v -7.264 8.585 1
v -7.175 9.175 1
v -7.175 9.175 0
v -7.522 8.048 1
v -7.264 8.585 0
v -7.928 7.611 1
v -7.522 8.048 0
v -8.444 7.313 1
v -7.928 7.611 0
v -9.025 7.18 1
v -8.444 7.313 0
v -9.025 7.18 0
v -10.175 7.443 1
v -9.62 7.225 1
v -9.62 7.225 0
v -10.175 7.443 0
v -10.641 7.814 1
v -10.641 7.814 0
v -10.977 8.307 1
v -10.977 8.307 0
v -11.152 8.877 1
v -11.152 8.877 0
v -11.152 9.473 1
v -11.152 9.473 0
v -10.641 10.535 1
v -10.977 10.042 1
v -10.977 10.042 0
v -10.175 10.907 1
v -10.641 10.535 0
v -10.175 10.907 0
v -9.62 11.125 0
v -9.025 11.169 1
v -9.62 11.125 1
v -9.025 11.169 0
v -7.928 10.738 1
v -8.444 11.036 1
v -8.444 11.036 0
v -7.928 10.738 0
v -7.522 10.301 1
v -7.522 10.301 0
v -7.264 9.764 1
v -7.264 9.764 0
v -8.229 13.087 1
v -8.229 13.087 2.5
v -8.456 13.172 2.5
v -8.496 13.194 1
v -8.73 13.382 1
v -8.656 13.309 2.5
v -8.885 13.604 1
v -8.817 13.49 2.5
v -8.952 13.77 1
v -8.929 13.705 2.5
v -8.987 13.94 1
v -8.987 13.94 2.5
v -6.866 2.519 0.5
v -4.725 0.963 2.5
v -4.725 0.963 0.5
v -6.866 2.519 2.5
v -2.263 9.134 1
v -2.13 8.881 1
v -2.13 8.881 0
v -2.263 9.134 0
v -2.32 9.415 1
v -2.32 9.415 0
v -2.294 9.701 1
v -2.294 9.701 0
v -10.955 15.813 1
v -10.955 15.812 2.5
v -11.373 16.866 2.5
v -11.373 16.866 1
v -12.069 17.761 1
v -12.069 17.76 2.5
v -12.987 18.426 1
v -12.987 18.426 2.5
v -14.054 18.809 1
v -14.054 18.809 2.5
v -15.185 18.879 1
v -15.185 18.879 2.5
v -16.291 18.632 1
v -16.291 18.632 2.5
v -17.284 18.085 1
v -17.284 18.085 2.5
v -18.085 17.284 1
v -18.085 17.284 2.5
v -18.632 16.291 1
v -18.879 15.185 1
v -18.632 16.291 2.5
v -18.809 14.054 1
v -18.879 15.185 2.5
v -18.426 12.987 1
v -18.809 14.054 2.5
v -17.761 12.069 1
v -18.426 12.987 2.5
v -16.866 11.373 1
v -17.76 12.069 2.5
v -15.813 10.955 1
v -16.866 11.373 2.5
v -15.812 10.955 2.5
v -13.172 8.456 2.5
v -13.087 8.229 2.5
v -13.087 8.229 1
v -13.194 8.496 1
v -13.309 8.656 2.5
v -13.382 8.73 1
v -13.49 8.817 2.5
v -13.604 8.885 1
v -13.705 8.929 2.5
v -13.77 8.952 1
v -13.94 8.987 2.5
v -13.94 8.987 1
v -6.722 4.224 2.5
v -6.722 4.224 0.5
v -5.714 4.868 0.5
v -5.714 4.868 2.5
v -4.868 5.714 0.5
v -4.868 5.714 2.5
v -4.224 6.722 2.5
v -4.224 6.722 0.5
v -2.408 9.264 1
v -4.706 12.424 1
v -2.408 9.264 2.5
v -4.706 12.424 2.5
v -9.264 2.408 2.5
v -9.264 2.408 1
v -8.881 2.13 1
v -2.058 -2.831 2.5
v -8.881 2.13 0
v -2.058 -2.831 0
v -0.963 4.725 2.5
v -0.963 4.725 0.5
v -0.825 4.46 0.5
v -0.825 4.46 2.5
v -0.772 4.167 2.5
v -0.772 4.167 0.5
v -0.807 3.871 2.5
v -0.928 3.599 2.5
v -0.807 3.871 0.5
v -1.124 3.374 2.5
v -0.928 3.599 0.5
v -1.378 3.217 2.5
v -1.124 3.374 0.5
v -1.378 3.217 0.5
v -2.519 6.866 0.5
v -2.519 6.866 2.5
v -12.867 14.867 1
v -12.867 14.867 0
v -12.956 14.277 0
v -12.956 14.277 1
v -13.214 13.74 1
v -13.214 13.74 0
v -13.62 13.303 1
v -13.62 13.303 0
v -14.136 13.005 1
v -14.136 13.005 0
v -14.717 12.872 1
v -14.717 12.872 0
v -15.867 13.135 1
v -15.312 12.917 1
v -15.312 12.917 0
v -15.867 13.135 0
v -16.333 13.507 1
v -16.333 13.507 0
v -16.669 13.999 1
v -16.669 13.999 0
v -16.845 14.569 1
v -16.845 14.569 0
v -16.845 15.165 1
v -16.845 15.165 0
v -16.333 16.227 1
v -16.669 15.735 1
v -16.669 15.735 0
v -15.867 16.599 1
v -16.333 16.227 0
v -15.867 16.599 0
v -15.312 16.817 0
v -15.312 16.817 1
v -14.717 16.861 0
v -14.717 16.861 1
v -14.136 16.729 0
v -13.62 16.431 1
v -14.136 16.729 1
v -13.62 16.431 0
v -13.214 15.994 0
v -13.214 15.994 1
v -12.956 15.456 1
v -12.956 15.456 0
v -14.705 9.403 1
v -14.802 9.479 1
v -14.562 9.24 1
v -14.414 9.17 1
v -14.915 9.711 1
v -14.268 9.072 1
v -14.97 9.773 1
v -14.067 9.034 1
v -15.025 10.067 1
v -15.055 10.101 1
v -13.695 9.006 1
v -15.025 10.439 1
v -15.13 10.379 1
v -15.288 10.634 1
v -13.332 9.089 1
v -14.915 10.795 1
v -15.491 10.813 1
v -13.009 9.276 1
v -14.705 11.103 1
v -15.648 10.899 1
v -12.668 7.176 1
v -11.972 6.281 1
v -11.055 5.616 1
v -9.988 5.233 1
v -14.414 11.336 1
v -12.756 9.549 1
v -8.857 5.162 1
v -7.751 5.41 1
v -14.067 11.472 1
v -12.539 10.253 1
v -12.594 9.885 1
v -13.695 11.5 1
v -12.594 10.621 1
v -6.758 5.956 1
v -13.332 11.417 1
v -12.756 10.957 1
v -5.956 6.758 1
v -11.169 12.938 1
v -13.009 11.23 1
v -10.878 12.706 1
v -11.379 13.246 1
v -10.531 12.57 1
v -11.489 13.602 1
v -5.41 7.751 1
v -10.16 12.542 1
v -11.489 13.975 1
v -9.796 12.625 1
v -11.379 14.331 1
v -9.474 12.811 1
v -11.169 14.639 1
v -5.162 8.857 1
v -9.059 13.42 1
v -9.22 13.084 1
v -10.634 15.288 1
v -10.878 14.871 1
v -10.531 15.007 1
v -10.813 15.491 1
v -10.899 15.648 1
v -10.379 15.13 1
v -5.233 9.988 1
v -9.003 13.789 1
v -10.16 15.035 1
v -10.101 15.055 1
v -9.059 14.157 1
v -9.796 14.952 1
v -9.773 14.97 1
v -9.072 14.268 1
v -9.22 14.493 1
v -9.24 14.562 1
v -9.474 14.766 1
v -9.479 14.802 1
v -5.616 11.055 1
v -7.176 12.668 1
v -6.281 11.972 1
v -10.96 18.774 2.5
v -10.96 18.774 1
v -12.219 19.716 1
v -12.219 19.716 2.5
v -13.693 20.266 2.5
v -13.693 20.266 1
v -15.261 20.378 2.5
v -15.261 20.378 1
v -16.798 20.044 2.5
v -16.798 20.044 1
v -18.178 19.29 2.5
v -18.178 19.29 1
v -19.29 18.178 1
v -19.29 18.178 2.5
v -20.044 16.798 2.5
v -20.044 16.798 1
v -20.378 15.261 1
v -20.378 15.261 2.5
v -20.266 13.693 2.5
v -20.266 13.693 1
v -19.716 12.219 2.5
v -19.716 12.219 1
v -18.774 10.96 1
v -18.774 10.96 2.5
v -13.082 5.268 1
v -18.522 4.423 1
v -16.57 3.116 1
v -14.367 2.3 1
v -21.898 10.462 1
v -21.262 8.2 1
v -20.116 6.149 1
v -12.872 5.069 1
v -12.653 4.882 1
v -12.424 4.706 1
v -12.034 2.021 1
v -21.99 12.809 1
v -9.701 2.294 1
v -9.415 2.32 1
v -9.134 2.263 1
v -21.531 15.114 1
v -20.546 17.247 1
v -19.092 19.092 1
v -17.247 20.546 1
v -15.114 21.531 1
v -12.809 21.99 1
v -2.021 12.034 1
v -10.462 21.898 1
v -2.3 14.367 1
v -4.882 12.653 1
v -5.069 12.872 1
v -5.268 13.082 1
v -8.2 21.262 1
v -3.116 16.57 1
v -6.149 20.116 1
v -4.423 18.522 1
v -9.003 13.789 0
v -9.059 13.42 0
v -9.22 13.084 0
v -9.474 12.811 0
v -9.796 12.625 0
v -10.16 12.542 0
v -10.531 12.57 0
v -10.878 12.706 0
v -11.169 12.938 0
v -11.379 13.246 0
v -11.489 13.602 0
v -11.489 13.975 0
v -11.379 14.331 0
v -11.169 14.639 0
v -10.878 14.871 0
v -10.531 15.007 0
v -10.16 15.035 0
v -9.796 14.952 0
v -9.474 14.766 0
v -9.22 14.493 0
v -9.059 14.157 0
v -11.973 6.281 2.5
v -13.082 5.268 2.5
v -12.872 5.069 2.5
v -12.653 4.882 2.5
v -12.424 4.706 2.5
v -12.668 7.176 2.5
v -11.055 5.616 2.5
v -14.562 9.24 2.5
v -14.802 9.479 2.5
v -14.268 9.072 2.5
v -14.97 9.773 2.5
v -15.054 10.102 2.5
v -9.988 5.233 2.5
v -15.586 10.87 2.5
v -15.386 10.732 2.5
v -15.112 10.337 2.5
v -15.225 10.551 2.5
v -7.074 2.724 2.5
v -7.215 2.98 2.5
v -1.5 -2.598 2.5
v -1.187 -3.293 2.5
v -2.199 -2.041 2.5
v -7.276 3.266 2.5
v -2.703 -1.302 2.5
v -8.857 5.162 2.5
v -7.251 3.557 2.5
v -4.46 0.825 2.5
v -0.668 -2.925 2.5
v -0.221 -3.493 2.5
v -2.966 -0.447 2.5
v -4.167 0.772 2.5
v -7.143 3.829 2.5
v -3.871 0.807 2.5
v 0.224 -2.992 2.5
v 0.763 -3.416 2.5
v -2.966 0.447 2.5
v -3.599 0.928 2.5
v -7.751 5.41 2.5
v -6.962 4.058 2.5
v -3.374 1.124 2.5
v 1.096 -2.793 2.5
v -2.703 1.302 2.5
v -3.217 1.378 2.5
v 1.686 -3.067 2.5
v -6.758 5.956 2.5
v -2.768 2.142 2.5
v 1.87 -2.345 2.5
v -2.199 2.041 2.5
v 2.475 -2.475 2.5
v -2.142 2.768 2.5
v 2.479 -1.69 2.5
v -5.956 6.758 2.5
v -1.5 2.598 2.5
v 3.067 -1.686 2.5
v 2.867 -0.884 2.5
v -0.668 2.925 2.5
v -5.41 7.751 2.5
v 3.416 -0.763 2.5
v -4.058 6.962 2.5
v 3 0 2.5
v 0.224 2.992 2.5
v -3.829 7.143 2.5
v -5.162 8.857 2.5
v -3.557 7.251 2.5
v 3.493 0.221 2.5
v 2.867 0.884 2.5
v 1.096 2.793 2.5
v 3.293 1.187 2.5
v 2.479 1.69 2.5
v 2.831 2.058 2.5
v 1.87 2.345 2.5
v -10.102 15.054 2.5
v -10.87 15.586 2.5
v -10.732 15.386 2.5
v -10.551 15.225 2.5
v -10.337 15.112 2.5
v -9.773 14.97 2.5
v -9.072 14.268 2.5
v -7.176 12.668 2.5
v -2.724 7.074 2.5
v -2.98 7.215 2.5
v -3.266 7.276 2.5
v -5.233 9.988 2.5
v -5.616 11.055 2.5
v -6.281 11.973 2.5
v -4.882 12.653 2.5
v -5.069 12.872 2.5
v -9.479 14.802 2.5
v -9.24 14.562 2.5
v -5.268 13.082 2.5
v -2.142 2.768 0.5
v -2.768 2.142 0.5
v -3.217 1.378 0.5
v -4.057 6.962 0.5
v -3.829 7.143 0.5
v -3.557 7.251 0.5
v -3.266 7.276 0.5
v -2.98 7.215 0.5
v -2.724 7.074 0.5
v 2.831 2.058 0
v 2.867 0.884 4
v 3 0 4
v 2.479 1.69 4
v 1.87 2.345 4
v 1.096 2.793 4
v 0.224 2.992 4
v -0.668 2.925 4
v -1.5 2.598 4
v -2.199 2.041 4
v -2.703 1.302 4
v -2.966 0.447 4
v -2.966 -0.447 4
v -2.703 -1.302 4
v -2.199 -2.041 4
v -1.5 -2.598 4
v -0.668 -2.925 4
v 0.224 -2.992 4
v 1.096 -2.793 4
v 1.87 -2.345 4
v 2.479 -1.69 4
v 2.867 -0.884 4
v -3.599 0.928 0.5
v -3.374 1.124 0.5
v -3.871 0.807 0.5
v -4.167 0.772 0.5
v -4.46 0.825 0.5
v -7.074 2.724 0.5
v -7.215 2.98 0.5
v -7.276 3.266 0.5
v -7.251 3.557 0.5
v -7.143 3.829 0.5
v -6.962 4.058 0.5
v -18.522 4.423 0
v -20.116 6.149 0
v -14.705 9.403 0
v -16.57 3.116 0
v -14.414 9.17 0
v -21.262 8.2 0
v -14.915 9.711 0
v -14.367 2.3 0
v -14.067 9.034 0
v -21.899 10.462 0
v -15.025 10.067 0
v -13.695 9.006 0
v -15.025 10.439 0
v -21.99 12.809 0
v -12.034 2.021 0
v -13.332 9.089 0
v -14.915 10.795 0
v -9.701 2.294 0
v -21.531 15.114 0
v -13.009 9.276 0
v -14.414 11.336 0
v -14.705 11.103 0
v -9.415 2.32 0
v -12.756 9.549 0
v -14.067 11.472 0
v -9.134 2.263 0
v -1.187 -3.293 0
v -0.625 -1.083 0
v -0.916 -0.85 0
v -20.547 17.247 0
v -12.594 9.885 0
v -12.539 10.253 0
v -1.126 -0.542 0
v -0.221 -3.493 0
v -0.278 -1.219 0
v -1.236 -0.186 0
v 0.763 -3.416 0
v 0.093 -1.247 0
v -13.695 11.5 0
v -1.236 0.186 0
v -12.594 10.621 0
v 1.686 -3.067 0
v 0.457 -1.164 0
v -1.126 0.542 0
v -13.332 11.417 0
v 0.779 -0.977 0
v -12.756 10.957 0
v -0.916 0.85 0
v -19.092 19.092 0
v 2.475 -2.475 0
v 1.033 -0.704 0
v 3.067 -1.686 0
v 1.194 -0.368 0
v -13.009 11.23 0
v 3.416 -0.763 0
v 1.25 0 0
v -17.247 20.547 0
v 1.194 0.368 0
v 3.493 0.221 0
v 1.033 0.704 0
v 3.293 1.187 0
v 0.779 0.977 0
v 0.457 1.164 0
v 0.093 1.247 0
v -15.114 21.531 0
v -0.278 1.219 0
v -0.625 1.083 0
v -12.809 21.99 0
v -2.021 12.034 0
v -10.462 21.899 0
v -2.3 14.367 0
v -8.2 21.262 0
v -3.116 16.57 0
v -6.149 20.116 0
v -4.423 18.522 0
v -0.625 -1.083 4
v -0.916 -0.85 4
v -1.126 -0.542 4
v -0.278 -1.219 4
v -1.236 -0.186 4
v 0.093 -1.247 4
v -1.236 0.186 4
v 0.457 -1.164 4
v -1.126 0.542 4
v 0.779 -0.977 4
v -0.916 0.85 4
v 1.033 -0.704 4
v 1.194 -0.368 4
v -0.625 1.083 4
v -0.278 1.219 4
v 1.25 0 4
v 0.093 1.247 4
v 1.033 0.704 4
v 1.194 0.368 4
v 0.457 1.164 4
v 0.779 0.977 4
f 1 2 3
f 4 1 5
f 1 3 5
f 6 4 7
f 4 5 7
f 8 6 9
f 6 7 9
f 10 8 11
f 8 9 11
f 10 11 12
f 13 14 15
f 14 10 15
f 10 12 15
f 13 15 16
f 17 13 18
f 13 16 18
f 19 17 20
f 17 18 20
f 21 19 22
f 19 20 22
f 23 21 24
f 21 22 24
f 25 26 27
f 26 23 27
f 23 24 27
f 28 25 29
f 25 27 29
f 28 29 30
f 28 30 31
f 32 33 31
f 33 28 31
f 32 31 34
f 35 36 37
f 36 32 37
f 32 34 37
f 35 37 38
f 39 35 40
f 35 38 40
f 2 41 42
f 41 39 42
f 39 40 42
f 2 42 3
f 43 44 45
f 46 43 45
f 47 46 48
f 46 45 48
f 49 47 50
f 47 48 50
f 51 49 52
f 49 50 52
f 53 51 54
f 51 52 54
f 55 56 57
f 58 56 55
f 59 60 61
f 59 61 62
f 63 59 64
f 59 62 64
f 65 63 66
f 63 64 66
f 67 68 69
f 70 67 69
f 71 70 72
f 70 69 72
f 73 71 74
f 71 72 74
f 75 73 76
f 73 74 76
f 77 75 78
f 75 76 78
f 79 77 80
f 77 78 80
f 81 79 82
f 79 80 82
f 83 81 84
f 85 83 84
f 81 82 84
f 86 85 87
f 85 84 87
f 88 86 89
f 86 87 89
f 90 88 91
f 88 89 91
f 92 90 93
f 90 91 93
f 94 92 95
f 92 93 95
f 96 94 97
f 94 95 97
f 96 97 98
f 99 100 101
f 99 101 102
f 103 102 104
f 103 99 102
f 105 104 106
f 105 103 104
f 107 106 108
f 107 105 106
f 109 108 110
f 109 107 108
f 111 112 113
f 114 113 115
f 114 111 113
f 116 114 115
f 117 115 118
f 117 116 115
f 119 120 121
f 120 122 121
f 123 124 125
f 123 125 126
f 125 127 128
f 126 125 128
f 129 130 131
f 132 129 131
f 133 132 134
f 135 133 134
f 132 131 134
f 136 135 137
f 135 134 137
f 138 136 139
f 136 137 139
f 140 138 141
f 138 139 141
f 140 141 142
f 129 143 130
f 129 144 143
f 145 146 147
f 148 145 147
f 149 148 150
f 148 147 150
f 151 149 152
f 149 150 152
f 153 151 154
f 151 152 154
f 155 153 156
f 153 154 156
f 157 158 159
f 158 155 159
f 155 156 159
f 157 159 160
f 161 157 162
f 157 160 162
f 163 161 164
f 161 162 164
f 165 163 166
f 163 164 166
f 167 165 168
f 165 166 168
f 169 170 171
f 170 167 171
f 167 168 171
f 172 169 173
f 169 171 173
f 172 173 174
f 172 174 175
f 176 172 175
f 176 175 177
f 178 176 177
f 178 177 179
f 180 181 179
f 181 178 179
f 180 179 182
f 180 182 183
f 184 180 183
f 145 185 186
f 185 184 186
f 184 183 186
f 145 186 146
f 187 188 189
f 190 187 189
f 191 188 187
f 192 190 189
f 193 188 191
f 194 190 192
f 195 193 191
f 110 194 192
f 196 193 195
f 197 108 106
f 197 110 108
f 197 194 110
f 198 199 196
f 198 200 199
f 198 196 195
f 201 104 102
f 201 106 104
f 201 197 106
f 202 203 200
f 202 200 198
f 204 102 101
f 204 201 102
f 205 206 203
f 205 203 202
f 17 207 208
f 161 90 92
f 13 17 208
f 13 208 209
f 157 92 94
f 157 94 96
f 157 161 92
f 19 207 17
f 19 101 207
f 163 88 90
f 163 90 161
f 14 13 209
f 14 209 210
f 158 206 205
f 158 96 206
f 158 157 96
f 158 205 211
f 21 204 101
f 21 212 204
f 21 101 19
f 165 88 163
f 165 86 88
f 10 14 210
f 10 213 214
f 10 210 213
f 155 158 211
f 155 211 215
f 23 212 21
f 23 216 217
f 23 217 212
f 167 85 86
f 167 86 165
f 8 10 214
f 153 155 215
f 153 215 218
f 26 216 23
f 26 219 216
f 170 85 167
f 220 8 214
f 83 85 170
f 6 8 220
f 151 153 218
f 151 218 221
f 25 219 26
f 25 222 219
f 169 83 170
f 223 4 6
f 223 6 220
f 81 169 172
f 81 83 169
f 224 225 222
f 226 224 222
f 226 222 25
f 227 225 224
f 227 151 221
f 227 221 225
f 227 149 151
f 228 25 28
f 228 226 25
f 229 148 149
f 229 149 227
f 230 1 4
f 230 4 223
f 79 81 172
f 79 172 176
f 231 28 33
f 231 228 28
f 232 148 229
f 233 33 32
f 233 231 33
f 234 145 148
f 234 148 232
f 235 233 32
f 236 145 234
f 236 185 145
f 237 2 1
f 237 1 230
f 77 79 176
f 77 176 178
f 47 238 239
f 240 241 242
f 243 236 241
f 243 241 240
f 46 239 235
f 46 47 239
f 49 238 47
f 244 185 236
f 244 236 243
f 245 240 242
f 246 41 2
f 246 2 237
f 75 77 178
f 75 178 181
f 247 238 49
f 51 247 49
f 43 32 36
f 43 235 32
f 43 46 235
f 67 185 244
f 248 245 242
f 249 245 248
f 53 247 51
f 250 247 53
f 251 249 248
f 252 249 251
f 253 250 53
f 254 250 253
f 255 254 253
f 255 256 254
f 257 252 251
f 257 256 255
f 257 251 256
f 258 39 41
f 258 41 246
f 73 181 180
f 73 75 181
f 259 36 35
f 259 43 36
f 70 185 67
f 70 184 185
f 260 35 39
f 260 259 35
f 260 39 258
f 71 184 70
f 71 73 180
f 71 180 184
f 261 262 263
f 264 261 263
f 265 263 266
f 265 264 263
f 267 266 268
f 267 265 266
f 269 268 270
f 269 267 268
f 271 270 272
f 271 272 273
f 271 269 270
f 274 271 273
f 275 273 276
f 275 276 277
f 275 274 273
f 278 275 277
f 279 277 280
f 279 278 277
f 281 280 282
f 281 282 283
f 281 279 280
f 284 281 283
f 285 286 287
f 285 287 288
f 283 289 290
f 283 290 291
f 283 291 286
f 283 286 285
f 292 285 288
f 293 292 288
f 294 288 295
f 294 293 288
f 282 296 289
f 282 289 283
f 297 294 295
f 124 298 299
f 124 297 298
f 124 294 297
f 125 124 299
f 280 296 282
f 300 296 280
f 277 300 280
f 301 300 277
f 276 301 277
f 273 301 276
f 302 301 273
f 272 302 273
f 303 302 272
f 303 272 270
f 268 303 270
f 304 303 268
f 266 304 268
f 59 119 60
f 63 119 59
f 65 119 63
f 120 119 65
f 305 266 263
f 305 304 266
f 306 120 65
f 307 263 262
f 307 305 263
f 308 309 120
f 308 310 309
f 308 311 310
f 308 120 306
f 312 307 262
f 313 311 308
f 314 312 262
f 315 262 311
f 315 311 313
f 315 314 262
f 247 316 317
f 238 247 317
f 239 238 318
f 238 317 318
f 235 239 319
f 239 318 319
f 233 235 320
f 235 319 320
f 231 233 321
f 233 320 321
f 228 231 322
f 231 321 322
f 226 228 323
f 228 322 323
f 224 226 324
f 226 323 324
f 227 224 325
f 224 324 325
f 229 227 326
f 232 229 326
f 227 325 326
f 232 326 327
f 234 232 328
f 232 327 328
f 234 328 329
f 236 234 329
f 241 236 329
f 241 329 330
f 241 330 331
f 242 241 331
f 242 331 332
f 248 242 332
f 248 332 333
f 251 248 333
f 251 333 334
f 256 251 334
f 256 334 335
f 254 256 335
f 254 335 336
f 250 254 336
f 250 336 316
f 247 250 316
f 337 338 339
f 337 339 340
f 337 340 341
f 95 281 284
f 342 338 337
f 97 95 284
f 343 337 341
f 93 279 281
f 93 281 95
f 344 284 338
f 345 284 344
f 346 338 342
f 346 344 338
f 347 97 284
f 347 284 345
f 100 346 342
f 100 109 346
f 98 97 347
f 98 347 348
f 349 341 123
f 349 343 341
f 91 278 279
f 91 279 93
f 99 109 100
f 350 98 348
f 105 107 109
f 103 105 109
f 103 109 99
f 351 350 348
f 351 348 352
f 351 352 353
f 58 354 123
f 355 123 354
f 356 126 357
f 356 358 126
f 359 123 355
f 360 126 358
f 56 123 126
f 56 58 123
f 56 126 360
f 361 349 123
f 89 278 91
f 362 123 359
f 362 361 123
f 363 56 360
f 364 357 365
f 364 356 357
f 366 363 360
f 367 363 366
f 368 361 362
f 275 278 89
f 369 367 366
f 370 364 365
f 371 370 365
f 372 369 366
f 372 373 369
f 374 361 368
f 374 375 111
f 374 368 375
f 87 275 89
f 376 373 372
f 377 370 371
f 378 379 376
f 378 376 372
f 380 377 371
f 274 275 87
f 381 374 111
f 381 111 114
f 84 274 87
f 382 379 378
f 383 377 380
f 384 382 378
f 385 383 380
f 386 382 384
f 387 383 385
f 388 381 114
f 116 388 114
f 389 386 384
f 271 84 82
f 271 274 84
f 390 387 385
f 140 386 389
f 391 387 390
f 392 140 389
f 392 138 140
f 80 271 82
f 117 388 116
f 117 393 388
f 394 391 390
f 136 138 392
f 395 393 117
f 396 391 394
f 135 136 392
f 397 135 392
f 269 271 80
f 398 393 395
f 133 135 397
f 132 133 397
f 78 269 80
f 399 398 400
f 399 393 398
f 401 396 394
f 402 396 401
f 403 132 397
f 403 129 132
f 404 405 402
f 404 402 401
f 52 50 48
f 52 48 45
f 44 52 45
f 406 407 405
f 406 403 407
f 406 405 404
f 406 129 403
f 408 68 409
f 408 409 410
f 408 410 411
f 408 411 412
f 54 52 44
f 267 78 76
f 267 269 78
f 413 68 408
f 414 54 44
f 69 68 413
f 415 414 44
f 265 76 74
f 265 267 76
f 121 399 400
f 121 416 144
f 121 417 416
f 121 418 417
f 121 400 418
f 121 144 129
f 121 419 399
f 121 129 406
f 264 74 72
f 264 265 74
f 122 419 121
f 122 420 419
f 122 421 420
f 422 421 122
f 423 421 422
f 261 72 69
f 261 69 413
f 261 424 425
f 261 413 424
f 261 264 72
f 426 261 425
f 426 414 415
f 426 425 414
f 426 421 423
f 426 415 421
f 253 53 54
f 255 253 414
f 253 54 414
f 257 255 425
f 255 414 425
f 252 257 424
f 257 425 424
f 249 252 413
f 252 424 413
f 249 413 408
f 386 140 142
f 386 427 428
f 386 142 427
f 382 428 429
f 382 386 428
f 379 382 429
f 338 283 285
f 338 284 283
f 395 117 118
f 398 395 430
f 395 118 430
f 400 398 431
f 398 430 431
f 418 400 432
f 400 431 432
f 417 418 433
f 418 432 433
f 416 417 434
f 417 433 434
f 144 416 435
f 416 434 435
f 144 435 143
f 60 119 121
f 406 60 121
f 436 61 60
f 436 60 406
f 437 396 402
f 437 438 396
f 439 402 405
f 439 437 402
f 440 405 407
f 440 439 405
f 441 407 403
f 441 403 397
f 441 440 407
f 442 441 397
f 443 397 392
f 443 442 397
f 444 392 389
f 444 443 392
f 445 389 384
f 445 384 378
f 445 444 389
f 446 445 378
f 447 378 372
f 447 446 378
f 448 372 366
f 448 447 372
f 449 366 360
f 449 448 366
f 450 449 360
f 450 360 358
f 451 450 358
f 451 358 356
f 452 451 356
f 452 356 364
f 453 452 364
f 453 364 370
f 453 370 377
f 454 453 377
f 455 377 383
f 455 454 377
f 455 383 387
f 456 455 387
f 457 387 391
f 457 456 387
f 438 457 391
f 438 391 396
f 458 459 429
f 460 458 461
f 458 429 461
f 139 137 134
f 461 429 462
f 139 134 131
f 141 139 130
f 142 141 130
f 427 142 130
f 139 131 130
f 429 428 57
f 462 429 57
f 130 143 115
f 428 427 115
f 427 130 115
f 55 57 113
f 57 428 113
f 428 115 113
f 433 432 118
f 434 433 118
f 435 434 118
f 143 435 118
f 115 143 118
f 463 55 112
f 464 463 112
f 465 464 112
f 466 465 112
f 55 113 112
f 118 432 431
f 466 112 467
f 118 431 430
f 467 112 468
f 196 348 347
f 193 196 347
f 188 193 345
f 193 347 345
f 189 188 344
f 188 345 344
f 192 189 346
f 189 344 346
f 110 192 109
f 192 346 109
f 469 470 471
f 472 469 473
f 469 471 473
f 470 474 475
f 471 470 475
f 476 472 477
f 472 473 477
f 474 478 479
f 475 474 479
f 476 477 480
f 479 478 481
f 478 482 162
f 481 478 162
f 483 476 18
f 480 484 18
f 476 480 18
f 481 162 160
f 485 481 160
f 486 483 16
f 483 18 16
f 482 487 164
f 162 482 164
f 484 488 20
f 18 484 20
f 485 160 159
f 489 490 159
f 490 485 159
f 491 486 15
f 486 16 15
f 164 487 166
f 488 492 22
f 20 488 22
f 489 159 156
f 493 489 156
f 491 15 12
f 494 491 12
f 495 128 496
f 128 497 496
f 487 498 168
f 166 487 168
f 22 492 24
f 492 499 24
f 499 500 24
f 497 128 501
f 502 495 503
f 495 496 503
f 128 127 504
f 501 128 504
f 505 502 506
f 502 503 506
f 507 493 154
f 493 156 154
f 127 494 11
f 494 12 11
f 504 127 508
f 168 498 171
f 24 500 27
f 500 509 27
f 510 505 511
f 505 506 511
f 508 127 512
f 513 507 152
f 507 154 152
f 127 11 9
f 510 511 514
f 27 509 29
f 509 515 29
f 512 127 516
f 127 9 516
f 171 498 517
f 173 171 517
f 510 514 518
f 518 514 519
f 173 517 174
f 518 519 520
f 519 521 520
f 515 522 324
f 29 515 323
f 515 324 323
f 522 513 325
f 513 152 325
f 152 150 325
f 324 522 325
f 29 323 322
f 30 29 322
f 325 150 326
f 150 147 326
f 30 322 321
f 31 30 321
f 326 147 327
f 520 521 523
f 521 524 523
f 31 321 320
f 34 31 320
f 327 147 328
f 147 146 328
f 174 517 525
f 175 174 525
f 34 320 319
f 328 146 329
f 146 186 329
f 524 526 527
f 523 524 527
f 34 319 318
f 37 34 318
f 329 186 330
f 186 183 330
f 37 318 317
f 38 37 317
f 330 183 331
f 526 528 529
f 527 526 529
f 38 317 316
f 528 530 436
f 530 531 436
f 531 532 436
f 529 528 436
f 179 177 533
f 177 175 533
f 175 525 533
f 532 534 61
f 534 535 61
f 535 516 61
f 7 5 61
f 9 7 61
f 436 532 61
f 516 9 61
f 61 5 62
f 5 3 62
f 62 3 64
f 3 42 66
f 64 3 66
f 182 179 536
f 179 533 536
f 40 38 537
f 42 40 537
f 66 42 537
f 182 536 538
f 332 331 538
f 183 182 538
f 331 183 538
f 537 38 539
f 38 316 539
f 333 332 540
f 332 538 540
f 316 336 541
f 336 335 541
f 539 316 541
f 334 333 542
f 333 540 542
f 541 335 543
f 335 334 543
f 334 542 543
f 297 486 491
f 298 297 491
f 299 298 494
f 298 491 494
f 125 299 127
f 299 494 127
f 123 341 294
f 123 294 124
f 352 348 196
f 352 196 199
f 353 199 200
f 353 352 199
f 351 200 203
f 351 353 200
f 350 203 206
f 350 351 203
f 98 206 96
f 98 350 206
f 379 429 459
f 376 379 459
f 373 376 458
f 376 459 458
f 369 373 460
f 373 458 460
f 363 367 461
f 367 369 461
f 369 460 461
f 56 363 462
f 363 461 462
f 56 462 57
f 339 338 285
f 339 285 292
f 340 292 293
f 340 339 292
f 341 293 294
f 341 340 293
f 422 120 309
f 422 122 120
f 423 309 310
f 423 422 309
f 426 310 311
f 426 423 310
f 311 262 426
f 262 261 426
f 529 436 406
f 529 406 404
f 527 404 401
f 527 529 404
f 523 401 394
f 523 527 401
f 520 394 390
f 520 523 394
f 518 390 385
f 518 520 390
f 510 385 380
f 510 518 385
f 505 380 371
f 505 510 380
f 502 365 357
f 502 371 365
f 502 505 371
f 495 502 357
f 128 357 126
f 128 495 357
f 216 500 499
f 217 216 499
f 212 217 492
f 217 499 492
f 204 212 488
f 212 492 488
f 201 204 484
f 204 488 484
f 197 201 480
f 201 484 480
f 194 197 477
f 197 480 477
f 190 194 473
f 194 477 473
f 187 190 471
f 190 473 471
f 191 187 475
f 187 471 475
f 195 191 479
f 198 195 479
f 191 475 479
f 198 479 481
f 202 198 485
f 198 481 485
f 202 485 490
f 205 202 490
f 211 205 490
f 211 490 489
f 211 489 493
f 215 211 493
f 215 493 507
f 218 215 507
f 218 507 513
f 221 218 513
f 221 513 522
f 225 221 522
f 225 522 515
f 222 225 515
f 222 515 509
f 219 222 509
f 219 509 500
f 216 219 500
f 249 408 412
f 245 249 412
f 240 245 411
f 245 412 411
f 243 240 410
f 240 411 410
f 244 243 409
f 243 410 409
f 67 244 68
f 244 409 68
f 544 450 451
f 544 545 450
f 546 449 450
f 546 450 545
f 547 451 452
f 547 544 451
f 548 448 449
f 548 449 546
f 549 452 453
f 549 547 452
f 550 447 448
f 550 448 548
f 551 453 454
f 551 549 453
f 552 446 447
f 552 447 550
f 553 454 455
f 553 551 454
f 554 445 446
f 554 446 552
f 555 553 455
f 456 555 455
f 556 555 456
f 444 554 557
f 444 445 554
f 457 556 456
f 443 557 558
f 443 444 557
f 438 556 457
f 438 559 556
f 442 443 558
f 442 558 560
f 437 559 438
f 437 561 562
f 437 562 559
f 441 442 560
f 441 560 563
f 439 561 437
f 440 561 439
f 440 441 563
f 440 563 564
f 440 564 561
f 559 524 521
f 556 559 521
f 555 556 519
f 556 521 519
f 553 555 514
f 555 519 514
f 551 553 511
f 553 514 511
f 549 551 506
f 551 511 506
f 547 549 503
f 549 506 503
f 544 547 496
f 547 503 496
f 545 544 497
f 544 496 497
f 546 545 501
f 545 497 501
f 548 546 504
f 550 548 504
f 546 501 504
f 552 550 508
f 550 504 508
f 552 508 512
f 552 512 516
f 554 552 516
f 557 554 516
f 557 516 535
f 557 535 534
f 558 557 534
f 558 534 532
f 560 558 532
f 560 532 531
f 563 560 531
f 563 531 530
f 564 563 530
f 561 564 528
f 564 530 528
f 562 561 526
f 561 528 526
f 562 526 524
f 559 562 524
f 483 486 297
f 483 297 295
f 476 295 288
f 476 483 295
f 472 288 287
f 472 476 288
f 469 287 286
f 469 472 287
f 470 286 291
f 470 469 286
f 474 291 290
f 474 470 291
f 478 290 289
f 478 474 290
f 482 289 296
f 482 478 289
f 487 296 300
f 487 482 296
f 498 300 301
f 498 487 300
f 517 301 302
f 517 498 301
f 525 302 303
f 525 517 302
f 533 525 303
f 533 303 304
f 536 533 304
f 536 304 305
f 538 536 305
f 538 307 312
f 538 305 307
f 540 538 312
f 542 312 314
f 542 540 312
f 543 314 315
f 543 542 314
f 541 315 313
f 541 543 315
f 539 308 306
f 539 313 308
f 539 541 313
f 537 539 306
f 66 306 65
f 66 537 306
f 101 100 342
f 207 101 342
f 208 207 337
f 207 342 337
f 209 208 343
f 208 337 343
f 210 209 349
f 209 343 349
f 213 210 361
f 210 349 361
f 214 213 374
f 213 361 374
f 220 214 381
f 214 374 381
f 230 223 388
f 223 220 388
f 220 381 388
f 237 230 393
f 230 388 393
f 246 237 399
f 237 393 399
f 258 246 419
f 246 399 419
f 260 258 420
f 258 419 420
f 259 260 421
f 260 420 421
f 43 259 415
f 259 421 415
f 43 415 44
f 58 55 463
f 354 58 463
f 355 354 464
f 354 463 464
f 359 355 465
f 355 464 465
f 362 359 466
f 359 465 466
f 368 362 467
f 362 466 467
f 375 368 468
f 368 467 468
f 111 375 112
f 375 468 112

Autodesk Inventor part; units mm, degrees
ref_plane "YZ Plane" through (0, 0, 0) normal (1, 0, 0) x (0, 1, 0)
ref_plane "XZ Plane" through (0, 0, 0) normal (0, 1, 0) x (-1, 0, 0)
ref_plane "XY Plane" through (0, 0, 0) normal (0, 0, 1) x (1, 0, 0)
sketch "スケッチ1" plane through (0, 0, 0) normal (0, 0, 1) x (1, 0, 0)
  line L0 (0, 0) -> (-12.0208, 12.0208)
  circle A0 centre (-9.1747, 9.1747) radius 2
  circle A1 centre (-14.8669, 14.8669) radius 2
  circle A2 centre (-14.8669, 14.8669) radius 4.025 construction
  circle A3 centre (-9.1747, 9.1747) radius 4.025 construction
  circle A4 centre (-13.7886, 10.253) radius 1.25
  circle A5 centre (-10.253, 13.7886) radius 1.25
  line L1 (-13.7886, 10.253) -> (-10.253, 13.7886) construction
  circle A6 centre (0, 0) radius 1.25
  arc A7 (-2.4749, 2.4749) -> (-2.0583, -2.8308) centre (0, 0) ccw construction
  arc A8 (-14.6971, 9.3445) -> (-9.5747, 16.4536) centre (-14.8669, 14.8669) ccw construction
  arc A9 (-14.467, 7.588) -> (-12.4239, 4.7061) centre (-9.1747, 9.1747) ccw
  line L2 (-12.4239, 4.7061) -> (-2.0583, -2.8308)
  line L3 (-4.7061, 12.4239) -> (2.8308, 2.0583)
  arc A10 (-11.1417, 16.3911) -> (-7.588, 14.467) centre (-10.253, 13.7886) ccw construction
  arc A11 (-16.4536, 9.5747) -> (-14.467, 7.588) centre (-13.7886, 10.253) ccw
  arc A12 (-16.3911, 11.1417) -> (-16.4536, 9.5747) centre (-13.7886, 10.253) ccw construction
  arc A13 (-14.467, 7.588) -> (-16.3911, 11.1417) centre (-13.7886, 10.253) ccw construction
  arc A14 (-16.4536, 9.5747) -> (-14.6971, 9.3445) centre (-14.8669, 14.8669) ccw construction
  arc A15 (-14.6971, 9.3445) -> (-14.467, 7.588) centre (-9.1747, 9.1747) ccw construction
  arc A16 (-9.5747, 16.4536) -> (-11.1417, 16.3911) centre (-10.253, 13.7886) ccw construction
  arc A17 (-7.588, 14.467) -> (-9.3445, 14.6971) centre (-9.1747, 9.1747) ccw construction
  arc A18 (-7.588, 14.467) -> (-9.5747, 16.4536) centre (-10.253, 13.7886) ccw
  arc A19 (-9.5747, 16.4536) -> (-16.4536, 9.5747) centre (-14.8669, 14.8669) ccw
  arc A20 (-9.3445, 14.6971) -> (-14.6971, 9.3445) centre (-9.1747, 9.1747) ccw construction
  arc A21 (-4.7061, 12.4239) -> (-7.588, 14.467) centre (-9.1747, 9.1747) ccw
  arc A22 (-12.4239, 4.7061) -> (-4.7061, 12.4239) centre (-9.1747, 9.1747) ccw construction
  arc A23 (2.8308, 2.0583) -> (-2.4749, 2.4749) centre (0, 0) ccw construction
  arc A24 (-2.0583, -2.8308) -> (2.8308, 2.0583) centre (0, 0) ccw
  circle A25 centre (-12.0208, 12.0208) radius 10
  point P0 (-2.4084, 9.2638)
  point P1 (-9.2638, 2.4084)
  dimension "d3" = 8.05
  dimension "d0" = 4
  dimension "d1" = 4
  dimension "d2" = 8.05
  dimension "d4" = 2.5
  dimension "d5" = 2.5
  dimension "d6" = 5
  dimension "d7" = 2.5
  dimension "d8" = 7
  dimension "d9" = 1.5
  dimension "d10" = 1.5
  dimension "d11" = 1.5
  dimension "d12" = 1.5
  dimension "d13" = 17
  dimension "d59" = 20
extrude "押し出し1" add sketch "スケッチ1" along normal blind 4
sketch "スケッチ2" plane through (0, 0, 4) normal (0, 0, 1) x (1, 0, 0)
  circle A0 centre (-14.8669, 14.8669) radius 2 projected
  circle A1 centre (-13.7886, 10.253) radius 1.25 projected
  circle A2 centre (-10.253, 13.7886) radius 1.25 projected
  circle A3 centre (-9.1747, 9.1747) radius 2 projected
  circle A4 centre (-14.8669, 14.8669) radius 4.025
  circle A5 centre (-9.1747, 9.1747) radius 4.025
  point P0 (0, 0)
  point P1 (-10.842, 14.8911)
  point P2 (-14.8911, 10.842)
  point P3 (-13.0613, 11.2697)
  point P4 (-12.0208, 12.0208)
  point P5 (-11.2697, 13.0613)
  point P6 (-9.1505, 13.1996)
  point P7 (-10.9804, 12.772)
  point P8 (-12.772, 10.9804)
  point P9 (-13.1996, 9.1505)
  dimension "d17" = 8.05
  dimension "d18" = 8.05
extrude "押し出し2" cut sketch "スケッチ2" against normal blind 3 contours A1 A5 A2 | A1 A4 A2
sketch "スケッチ3" plane through (0, 0, 4) normal (0, 0, 1) x (1, 0, 0)
  arc A0 (-13.0613, 11.2697) -> (-12.0208, 12.0208) centre (-14.8669, 14.8669) ccw projected
  arc A1 (-12.772, 10.9804) -> (-13.0613, 11.2697) centre (-13.7886, 10.253) ccw projected
  arc A2 (-12.0208, 12.0208) -> (-12.772, 10.9804) centre (-9.1747, 9.1747) ccw projected
  arc A3 (-12.0208, 12.0208) -> (-11.2697, 13.0613) centre (-14.8669, 14.8669) ccw projected
  arc A4 (-10.9804, 12.772) -> (-12.0208, 12.0208) centre (-9.1747, 9.1747) ccw projected
  arc A5 (-11.2697, 13.0613) -> (-10.9804, 12.772) centre (-10.253, 13.7886) ccw projected
  arc A6 (-13.0613, 11.2697) -> (-14.8911, 10.842) centre (-13.7886, 10.253) ccw projected
  circle A7 centre (-13.7886, 10.253) radius 1.275
  circle A8 centre (-10.253, 13.7886) radius 1.275
  point P0 (0, 0)
  point P1 (-11.2824, 13.0362)
  point P2 (-11.0055, 12.7593)
  point P3 (-13.0362, 11.2824)
  point P4 (-12.7593, 11.0055)
  dimension "d21" = 2.55
  dimension "d22" = 2.55
extrude "押し出し3" cut sketch "スケッチ3" against normal blind 3
fillet "フィレット1" radius 1 4 edges at (-9.1224, 13.1994, 2.5) (-10.8423, 14.9193, 2.5) (-14.9193, 10.8423, 2.5) (-13.1994, 9.1224, 2.5)
sketch "スケッチ4" plane through (0, 0, 4) normal (0, 0, 1) x (1, 0, 0)
  circle A0 centre (0, 0) radius 1.25 projected
  circle A1 centre (0, 0) radius 3
  circle A2 centre (0, 0) radius 1.25 projected
  line L0 (-9.2638, 2.4084) -> (-2.0583, -2.8308) projected
  arc A3 (-2.0583, -2.8308) -> (2.8308, 2.0583) centre (0, 0) ccw projected
  line L1 (2.8308, 2.0583) -> (-2.4084, 9.2638) projected
  arc A4 (-2.4084, 9.2638) -> (-9.2638, 2.4084) centre (-12.0208, 12.0208) ccw projected
  arc A5 (-13.0871, 8.2291) -> (-13.9402, 8.9871) centre (-14.0591, 7.9942) ccw projected
  arc A6 (-15.0545, 10.1015) -> (-13.9402, 8.9871) centre (-13.7886, 10.253) ccw projected
  arc A7 (-15.0545, 10.1015) -> (-15.8125, 10.9546) centre (-16.0474, 9.9826) ccw projected
  arc A8 (-10.9546, 15.8125) -> (-15.8125, 10.9546) centre (-14.8669, 14.8669) ccw projected
  arc A9 (-10.9546, 15.8125) -> (-10.1015, 15.0545) centre (-9.9826, 16.0474) ccw projected
  arc A10 (-8.9871, 13.9402) -> (-10.1015, 15.0545) centre (-10.253, 13.7886) ccw projected
  arc A11 (-8.9871, 13.9402) -> (-8.2291, 13.0871) centre (-7.9942, 14.0591) ccw projected
  arc A12 (-13.0871, 8.2291) -> (-8.2291, 13.0871) centre (-9.1747, 9.1747) ccw projected
  dimension "d27" = 6
extrude "押し出し4" cut sketch "スケッチ4" against normal blind 1.5 contours A4 L1 A3 L0
sketch "スケッチ8" plane through (0, 0, 2.5) normal (0, 0, 1) x (1, 0, 0)
  circle A0 centre (-9.1747, 9.1747) radius 2 projected
  circle A1 centre (-14.8669, 14.8669) radius 2 projected
  arc A2 (-10.9546, 15.8125) -> (-15.8125, 10.9546) centre (-14.8669, 14.8669) ccw projected
  circle A3 centre (-13.7886, 10.253) radius 1.25 projected
  arc A4 (-13.0871, 8.2291) -> (-8.2291, 13.0871) centre (-9.1747, 9.1747) ccw projected
  circle A5 centre (-10.253, 13.7886) radius 1.25 projected
  arc A6 (-8.9871, 13.9402) -> (-8.2291, 13.0871) centre (-7.9942, 14.0591) ccw projected
  arc A7 (-8.9871, 13.9402) -> (-10.1015, 15.0545) centre (-10.253, 13.7886) ccw projected
  arc A8 (-10.9546, 15.8125) -> (-10.1015, 15.0545) centre (-9.9826, 16.0474) ccw projected
  arc A9 (-15.0545, 10.1015) -> (-15.8125, 10.9546) centre (-16.0474, 9.9826) ccw projected
  arc A10 (-15.0545, 10.1015) -> (-13.9402, 8.9871) centre (-13.7886, 10.253) ccw projected
  arc A11 (-13.0871, 8.2291) -> (-13.9402, 8.9871) centre (-14.0591, 7.9942) ccw projected
  arc A12 (-9.5831, 16.4815) -> (-16.4815, 9.5831) centre (-14.8669, 14.8669) ccw
  arc A13 (-7.5601, 14.4585) -> (-9.5831, 16.4815) centre (-10.253, 13.7886) ccw
  arc A14 (-14.4585, 7.5601) -> (-7.5601, 14.4585) centre (-9.1747, 9.1747) ccw
  arc A15 (-16.4815, 9.5831) -> (-14.4585, 7.5601) centre (-13.7886, 10.253) ccw
  line L0 (-18.7737, 10.9602) -> (-13.0815, 5.2679)
  line L1 (-10.9602, 18.7737) -> (-5.2679, 13.0815)
  line L2 (-2.0583, -2.8308) -> (-9.2638, 2.4084) projected
  arc A16 (-2.4084, 9.2638) -> (-9.2638, 2.4084) centre (-12.0208, 12.0208) ccw projected
  line L3 (-2.0583, -2.8308) -> (-9.2638, 2.4084) projected
  arc A17 (-2.0583, -2.8308) -> (2.8308, 2.0583) centre (0, 0) ccw projected
  line L4 (-2.4084, 9.2638) -> (2.8308, 2.0583) projected
  circle A18 centre (0, 0) radius 3 projected
  arc A19 (-10.9546, 15.8125) -> (-15.8125, 10.9546) centre (-14.8669, 14.8669) ccw projected
  arc A20 (-10.9546, 15.8125) -> (-10.1015, 15.0545) centre (-9.9826, 16.0474) ccw projected
  arc A21 (-8.9871, 13.9402) -> (-10.1015, 15.0545) centre (-10.253, 13.7886) ccw projected
  arc A22 (-8.9871, 13.9402) -> (-8.2291, 13.0871) centre (-7.9942, 14.0591) ccw projected
  arc A23 (-13.0871, 8.2291) -> (-8.2291, 13.0871) centre (-9.1747, 9.1747) ccw projected
  arc A24 (-13.0871, 8.2291) -> (-13.9402, 8.9871) centre (-14.0591, 7.9942) ccw projected
  arc A25 (-15.0545, 10.1015) -> (-13.9402, 8.9871) centre (-13.7886, 10.253) ccw projected
  arc A26 (-15.0545, 10.1015) -> (-15.8125, 10.9546) centre (-16.0474, 9.9826) ccw projected
  line L5 (-12.4239, 4.7061) -> (-9.2638, 2.4084)
  line L6 (-4.7061, 12.4239) -> (-2.4084, 9.2638)
  dimension "d61" = 1.5
extrude "押し出し8" cut sketch "スケッチ8" against normal blind 1.5 contours A12 L0 A14 L5 A16 L6 L1
sketch "スケッチ9" plane through (0, 0, 2.5) normal (0, 0, 1) x (1, 0, 0)
  circle A0 centre (-9.1747, 9.1747) radius 2 projected
  circle A1 centre (-14.8669, 14.8669) radius 2 projected
  circle A2 centre (0, 0) radius 3 projected
  circle A3 centre (0, 0) radius 3.5
  arc A4 (-14.4585, 7.5601) -> (-7.5601, 14.4585) centre (-9.1747, 9.1747) ccw
  arc A5 (-16.4815, 9.5831) -> (-14.4585, 7.5601) centre (-13.7886, 10.253) ccw
  arc A6 (-9.5831, 16.4815) -> (-16.4815, 9.5831) centre (-14.8669, 14.8669) ccw
  arc A7 (-7.5601, 14.4585) -> (-9.5831, 16.4815) centre (-10.253, 13.7886) ccw
  line L0 (-2.4084, 9.2638) -> (2.8308, 2.0583) projected
  line L1 (-2.0583, -2.8308) -> (-9.2638, 2.4084) projected
  line L2 (-3.9623, 8.8502) -> (1.6176, 1.1762)
  line L3 (-1.1762, -1.6176) -> (-8.8502, 3.9623)
  arc A8 (-10.9546, 15.8125) -> (-15.8125, 10.9546) centre (-14.8669, 14.8669) ccw projected
  circle A9 centre (-13.7886, 10.253) radius 1.25 projected
  arc A10 (-13.0871, 8.2291) -> (-8.2291, 13.0871) centre (-9.1747, 9.1747) ccw projected
  circle A11 centre (-10.253, 13.7886) radius 1.25 projected
  arc A12 (-8.9871, 13.9402) -> (-8.2291, 13.0871) centre (-7.9942, 14.0591) ccw projected
  arc A13 (-8.9871, 13.9402) -> (-10.1015, 15.0545) centre (-10.253, 13.7886) ccw projected
  arc A14 (-10.9546, 15.8125) -> (-10.1015, 15.0545) centre (-9.9826, 16.0474) ccw projected
  arc A15 (-15.0545, 10.1015) -> (-15.8125, 10.9546) centre (-16.0474, 9.9826) ccw projected
  arc A16 (-15.0545, 10.1015) -> (-13.9402, 8.9871) centre (-13.7886, 10.253) ccw projected
  arc A17 (-13.0871, 8.2291) -> (-13.9402, 8.9871) centre (-14.0591, 7.9942) ccw projected
  point P0 (-8.4806, 3.6935)
  point P1 (-3.4993, 0.0715)
  point P2 (-0.0715, 3.4993)
  point P3 (-3.6935, 8.4806)
  dimension "d48" = 0.5
  dimension "d50" = 1.5
  dimension "d51" = 1.5
extrude "押し出し9" cut sketch "スケッチ9" against normal through all contours A3 L3 A4 L2
fillet "フィレット4" radius 1 4 edges at (-8.4806, 3.6935, 1.25) (-3.4993, 0.0715, 1.25) (-3.6935, 8.4806, 1.25) (-0.0715, 3.4993, 1.25)
fillet "フィレット6" radius 1 2 edges at (-9.2638, 2.4084, 0.5) (-2.4084, 9.2638, 0.5)
sketch "スケッチ10" plane through (0, 0, 0) normal (0, 0, -1) x (-1, 0, 0)
  line L0 (0.9626, 4.7248) -> (2.5193, 6.8657) projected
  arc A0 (4.2241, 6.7216) -> (2.5193, 6.8657) centre (3.3281, 6.2776) ccw projected
  arc A1 (4.2241, 6.7216) -> (6.7216, 4.2241) centre (9.1747, 9.1747) ccw projected
  arc A2 (6.8657, 2.5193) -> (6.7216, 4.2241) centre (6.2776, 3.3281) ccw projected
  line L1 (6.8657, 2.5193) -> (4.7248, 0.9626) projected
  arc A3 (3.2174, 1.3778) -> (4.7248, 0.9626) centre (4.1367, 1.7714) ccw projected
  arc A4 (3.2174, 1.3778) -> (1.3778, 3.2174) centre (0, 0) ccw projected
  arc A5 (0.9626, 4.7248) -> (1.3778, 3.2174) centre (1.7714, 4.1367) ccw projected
  line L2 (-2.8308, 2.0583) -> (2.1298, 8.8806) projected
  arc A6 (-2.8308, 2.0583) -> (2.0583, -2.8308) centre (0, 0) ccw projected
  line L3 (8.8806, 2.1298) -> (2.0583, -2.8308) projected
  arc A7 (9.7007, 2.2937) -> (8.8806, 2.1298) centre (9.4687, 1.321) ccw projected
  arc A8 (9.7007, 2.2937) -> (2.2937, 9.7007) centre (12.0208, 12.0208) ccw projected
  arc A9 (2.1298, 8.8806) -> (2.2937, 9.7007) centre (1.321, 9.4687) ccw projected
  circle A10 centre (9.1747, 9.1747) radius 2 projected
  circle A11 centre (0, 0) radius 1.25 projected
  circle A12 centre (14.8669, 14.8669) radius 2 projected
  circle A13 centre (10.253, 13.7886) radius 1.25 projected
  circle A14 centre (13.7886, 10.253) radius 1.25 projected
extrude "押し出し10" add sketch "スケッチ10" against normal blind 0.5 contours L0 A0 A1 A2 L1 A3 A4 A5
sketch "スケッチ11" plane through (0, 0, 4) normal (0, 0, 1) x (1, 0, 0)
  circle A0 centre (0, 0) radius 3 projected
  arc A1 (-10.9546, 15.8125) -> (-15.8125, 10.9546) centre (-14.8669, 14.8669) ccw projected
  arc A2 (-10.9546, 15.8125) -> (-10.1015, 15.0545) centre (-9.9826, 16.0474) ccw projected
  arc A3 (-8.9871, 13.9402) -> (-10.1015, 15.0545) centre (-10.253, 13.7886) ccw projected
  arc A4 (-8.9871, 13.9402) -> (-8.2291, 13.0871) centre (-7.9942, 14.0591) ccw projected
  arc A5 (-13.0871, 8.2291) -> (-8.2291, 13.0871) centre (-9.1747, 9.1747) ccw projected
  arc A6 (-13.0871, 8.2291) -> (-13.9402, 8.9871) centre (-14.0591, 7.9942) ccw projected
  arc A7 (-15.0545, 10.1015) -> (-13.9402, 8.9871) centre (-13.7886, 10.253) ccw projected
  arc A8 (-15.0545, 10.1015) -> (-15.8125, 10.9546) centre (-16.0474, 9.9826) ccw projected
  arc A9 (-1.3778, 3.2174) -> (-3.2174, 1.3778) centre (0, 0) ccw projected
  arc A10 (-1.3778, 3.2174) -> (-0.9626, 4.7248) centre (-1.7714, 4.1367) ccw projected
  line L0 (-2.5193, 6.8657) -> (-0.9626, 4.7248) projected
  arc A11 (-2.5193, 6.8657) -> (-4.2241, 6.7216) centre (-3.3281, 6.2776) ccw projected
  arc A12 (-6.7216, 4.2241) -> (-4.2241, 6.7216) centre (-9.1747, 9.1747) ccw projected
  arc A13 (-6.7216, 4.2241) -> (-6.8657, 2.5193) centre (-6.2776, 3.3281) ccw projected
  line L1 (-4.7248, 0.9626) -> (-6.8657, 2.5193) projected
  arc A14 (-4.7248, 0.9626) -> (-3.2174, 1.3778) centre (-4.1367, 1.7714) ccw projected
  line L2 (2.8308, 2.0583) -> (-4.7061, 12.4239) projected
  line L3 (-5.2679, 13.0815) -> (-10.9602, 18.7737) projected
  arc A15 (-10.9602, 18.7737) -> (-18.7737, 10.9602) centre (-14.8669, 14.8669) ccw projected
  line L4 (-18.7737, 10.9602) -> (-13.0815, 5.2679) projected
  arc A16 (-13.0815, 5.2679) -> (-12.4239, 4.7061) centre (-9.1747, 9.1747) ccw projected
  line L5 (-2.0583, -2.8308) -> (-12.4239, 4.7061) projected
  arc A17 (-4.7061, 12.4239) -> (-5.2679, 13.0815) centre (-9.1747, 9.1747) ccw projected
  arc A18 (-2.0583, -2.8308) -> (2.8308, 2.0583) centre (0, 0) ccw projected
  line L6 (2.8308, 2.0583) -> (-2.1298, 8.8806) projected
  arc A19 (-2.0583, -2.8308) -> (2.8308, 2.0583) centre (0, 0) ccw projected
  line L7 (-8.8806, 2.1298) -> (-2.0583, -2.8308) projected
  arc A20 (-8.8806, 2.1298) -> (-9.7007, 2.2937) centre (-9.4687, 1.321) ccw projected
  arc A21 (-2.2937, 9.7007) -> (-9.7007, 2.2937) centre (-12.0208, 12.0208) ccw projected
  arc A22 (-2.2937, 9.7007) -> (-2.1298, 8.8806) centre (-1.321, 9.4687) ccw projected
  circle A23 centre (-9.1747, 9.1747) radius 2 projected
  circle A24 centre (0, 0) radius 1.25 projected
  circle A25 centre (-14.8669, 14.8669) radius 2 projected
  circle A26 centre (-10.253, 13.7886) radius 1.25 projected
  circle A27 centre (-13.7886, 10.253) radius 1.25 projected
equation "\"d3\" = d2"
equation "\"d0\" = d1"
equation "\"d21\" = d22"
properties part number "脚クランク涙型1" material "アルミニウム 7075"
